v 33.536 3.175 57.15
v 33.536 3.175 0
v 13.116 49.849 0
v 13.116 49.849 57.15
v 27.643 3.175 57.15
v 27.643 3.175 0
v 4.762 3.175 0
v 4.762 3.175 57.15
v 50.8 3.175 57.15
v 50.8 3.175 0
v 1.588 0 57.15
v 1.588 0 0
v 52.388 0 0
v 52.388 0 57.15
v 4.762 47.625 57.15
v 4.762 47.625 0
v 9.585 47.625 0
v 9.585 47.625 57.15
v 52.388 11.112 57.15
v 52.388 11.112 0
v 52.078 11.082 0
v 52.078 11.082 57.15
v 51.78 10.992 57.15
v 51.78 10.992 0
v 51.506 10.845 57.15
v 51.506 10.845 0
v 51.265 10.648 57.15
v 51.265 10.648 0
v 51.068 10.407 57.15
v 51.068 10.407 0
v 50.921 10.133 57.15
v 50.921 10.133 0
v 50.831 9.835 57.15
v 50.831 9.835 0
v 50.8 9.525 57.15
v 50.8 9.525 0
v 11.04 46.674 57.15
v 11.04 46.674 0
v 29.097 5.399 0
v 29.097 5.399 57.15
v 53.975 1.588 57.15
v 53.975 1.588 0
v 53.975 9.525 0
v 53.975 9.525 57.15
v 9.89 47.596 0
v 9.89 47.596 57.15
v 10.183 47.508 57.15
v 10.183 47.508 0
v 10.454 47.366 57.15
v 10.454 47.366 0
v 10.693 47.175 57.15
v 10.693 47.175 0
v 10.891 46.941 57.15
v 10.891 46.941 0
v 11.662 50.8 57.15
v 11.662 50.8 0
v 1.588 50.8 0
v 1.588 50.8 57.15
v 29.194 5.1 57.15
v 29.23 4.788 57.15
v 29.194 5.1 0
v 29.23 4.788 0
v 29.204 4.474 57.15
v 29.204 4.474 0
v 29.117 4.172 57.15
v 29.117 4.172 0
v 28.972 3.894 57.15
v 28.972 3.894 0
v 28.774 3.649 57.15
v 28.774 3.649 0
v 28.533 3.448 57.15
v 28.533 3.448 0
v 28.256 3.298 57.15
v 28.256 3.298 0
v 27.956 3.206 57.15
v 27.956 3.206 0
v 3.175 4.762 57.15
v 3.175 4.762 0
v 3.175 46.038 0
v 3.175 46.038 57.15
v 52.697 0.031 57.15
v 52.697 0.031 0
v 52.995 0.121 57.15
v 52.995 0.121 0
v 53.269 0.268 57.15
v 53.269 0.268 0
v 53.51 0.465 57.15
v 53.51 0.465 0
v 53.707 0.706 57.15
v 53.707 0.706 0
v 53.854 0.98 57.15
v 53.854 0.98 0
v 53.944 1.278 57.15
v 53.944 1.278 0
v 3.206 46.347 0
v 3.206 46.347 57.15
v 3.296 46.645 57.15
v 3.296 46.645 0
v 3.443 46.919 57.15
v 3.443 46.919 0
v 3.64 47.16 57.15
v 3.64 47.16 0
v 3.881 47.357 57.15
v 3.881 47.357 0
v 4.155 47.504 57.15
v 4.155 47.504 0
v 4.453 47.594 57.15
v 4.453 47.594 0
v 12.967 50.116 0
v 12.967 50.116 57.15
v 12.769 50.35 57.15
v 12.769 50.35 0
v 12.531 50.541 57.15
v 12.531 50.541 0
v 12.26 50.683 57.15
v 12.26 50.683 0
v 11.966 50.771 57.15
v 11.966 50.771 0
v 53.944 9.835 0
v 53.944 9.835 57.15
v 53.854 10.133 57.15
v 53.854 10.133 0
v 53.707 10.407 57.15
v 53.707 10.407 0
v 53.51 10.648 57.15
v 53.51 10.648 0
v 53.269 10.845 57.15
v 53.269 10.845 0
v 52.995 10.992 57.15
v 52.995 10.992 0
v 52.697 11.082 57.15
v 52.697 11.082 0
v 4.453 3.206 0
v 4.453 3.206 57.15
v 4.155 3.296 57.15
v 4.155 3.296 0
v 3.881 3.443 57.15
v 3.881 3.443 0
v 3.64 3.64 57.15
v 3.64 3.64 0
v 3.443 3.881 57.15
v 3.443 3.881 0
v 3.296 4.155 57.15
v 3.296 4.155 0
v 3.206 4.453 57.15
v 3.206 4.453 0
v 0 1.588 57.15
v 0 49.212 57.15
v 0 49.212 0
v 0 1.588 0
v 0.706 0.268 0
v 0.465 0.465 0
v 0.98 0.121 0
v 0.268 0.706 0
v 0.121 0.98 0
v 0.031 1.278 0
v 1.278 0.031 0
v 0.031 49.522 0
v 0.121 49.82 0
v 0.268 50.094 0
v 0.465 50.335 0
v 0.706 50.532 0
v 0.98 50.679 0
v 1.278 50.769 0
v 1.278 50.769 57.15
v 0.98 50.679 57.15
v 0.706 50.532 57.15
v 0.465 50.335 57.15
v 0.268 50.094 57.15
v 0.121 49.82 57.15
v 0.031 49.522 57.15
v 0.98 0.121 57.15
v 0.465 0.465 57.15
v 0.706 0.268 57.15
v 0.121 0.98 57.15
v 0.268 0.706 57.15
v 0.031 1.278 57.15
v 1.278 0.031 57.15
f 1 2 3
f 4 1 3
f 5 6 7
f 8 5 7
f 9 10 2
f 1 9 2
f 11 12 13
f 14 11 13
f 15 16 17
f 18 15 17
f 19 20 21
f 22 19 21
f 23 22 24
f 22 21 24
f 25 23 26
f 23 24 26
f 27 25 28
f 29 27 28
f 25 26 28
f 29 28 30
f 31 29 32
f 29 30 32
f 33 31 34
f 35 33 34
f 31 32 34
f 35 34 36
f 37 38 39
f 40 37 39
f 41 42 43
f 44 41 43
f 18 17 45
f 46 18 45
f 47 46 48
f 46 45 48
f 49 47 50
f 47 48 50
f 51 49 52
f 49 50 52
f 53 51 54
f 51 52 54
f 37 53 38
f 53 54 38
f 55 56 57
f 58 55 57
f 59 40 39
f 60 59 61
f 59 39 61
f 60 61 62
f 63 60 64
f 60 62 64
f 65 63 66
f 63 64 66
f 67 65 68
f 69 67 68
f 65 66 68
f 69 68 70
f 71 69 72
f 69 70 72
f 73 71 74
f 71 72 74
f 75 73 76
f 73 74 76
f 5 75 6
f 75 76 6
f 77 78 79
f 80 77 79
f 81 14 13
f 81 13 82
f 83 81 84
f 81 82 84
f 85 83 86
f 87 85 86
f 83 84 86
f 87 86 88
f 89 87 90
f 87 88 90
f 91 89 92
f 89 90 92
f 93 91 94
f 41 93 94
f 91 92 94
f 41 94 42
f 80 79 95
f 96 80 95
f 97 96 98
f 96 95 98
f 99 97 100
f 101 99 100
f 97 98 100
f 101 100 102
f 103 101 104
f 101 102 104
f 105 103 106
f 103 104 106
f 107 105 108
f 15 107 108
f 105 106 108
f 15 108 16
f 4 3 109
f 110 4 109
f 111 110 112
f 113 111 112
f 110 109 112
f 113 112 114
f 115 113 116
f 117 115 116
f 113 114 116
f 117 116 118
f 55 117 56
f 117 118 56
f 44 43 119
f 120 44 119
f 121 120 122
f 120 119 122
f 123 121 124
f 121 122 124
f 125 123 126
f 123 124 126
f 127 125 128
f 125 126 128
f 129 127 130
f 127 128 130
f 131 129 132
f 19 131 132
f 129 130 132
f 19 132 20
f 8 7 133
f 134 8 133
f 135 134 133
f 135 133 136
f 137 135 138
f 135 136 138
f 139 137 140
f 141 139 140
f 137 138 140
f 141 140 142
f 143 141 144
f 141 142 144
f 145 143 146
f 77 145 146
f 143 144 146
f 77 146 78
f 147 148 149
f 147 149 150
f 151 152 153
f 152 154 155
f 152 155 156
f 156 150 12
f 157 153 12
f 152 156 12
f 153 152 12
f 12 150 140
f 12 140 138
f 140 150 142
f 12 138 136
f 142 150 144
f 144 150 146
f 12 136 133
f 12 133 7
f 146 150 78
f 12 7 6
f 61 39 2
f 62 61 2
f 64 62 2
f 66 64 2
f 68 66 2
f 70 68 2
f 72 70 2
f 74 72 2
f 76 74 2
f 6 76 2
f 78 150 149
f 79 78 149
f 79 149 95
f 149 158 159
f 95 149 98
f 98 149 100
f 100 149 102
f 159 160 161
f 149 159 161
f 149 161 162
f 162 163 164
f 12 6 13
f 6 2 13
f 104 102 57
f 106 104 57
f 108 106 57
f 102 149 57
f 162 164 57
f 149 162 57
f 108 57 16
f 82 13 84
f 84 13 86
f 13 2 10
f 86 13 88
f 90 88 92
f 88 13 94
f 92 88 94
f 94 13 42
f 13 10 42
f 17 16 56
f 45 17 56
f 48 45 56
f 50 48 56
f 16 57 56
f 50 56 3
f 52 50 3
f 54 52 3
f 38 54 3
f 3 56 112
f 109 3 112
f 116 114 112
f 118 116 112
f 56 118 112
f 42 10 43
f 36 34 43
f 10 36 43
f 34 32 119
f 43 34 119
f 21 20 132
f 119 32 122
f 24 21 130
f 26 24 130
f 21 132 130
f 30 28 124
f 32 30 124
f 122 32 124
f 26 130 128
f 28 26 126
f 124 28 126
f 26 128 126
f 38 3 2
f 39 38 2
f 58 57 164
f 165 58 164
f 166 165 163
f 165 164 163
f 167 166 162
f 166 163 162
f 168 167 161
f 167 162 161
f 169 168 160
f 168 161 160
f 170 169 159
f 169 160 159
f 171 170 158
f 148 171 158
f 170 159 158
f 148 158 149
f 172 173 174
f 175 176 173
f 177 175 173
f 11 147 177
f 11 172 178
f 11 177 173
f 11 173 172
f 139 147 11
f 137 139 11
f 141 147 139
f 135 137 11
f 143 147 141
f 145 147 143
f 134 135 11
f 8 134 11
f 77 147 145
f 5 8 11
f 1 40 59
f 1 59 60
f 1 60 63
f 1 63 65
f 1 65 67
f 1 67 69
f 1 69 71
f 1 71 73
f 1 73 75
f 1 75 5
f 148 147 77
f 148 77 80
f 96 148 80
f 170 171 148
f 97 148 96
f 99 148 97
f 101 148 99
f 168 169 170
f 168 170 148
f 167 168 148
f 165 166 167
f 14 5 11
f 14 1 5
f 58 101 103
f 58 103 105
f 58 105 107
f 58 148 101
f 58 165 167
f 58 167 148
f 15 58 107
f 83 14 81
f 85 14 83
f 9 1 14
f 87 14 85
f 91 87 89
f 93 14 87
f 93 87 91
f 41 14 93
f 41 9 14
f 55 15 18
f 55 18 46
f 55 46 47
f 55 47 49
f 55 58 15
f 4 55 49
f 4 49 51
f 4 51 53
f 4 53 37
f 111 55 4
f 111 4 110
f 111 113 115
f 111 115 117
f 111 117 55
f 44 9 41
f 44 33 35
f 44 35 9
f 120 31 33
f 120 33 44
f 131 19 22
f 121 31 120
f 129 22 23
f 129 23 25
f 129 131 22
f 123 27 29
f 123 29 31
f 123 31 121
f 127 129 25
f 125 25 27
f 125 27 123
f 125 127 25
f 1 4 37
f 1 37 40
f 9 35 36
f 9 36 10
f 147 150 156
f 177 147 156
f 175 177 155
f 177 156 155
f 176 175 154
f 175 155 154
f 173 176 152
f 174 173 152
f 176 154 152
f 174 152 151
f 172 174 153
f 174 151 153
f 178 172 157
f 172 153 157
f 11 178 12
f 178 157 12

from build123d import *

# Parameters (mm, degrees)
F1_DEPTH = 57.15


with BuildPart() as f1:
    # F0 (on Top) → F1 (new body)
    with BuildSketch(Plane.XY):
        with BuildLine():
            ThreePointArc((0, 1.5875), (0.464968, 0.464968), (1.5875, 0))
            Line((1.5875, 0), (34.925, 0))
            Line((34.925, 0), (33.535938, 3.175))
            Line((33.535938, 3.175), (13.11615, 49.8488))
            ThreePointArc((13.11615, 49.8488), (12.530666, 50.541086), (11.66175, 50.8))
            Line((11.66175, 50.8), (1.5875, 50.8))
            ThreePointArc((1.5875, 50.8), (0.464968, 50.335032), (0, 49.2125))
            Line((0, 49.2125), (0, 1.5875))
        make_face()
        with BuildLine():
            ThreePointArc((4.7625, 3.175), (3.639968, 3.639968), (3.175, 4.7625))
            Line((3.175, 4.7625), (3.175, 46.0375))
            ThreePointArc((3.175, 46.0375), (3.639968, 47.160032), (4.7625, 47.625))
            Line((4.7625, 47.625), (9.585251, 47.625))
            ThreePointArc((9.585251, 47.625), (10.454167, 47.366086), (11.039651, 46.6738))
            Line((11.039651, 46.6738), (29.097463, 5.3988))
            ThreePointArc((29.097463, 5.3988), (28.971649, 3.893584), (27.643063, 3.175))
            Line((27.643063, 3.175), (4.7625, 3.175))
        make_face(mode=Mode.SUBTRACT)
        with BuildLine():
            Line((33.535938, 3.175), (34.925, 0))
            Line((34.925, 0), (52.3875, 0))
            ThreePointArc((52.3875, 0), (53.510032, 0.464968), (53.975, 1.5875))
            Line((53.975, 1.5875), (53.975, 9.525))
            ThreePointArc((53.975, 9.525), (53.510032, 10.647532), (52.3875, 11.1125))
            ThreePointArc((52.3875, 11.1125), (51.264968, 10.647532), (50.8, 9.525))
            Line((50.8, 9.525), (50.8, 3.175))
            Line((50.8, 3.175), (33.535938, 3.175))
        make_face()
    extrude(amount=F1_DEPTH)


solid = f1.part
